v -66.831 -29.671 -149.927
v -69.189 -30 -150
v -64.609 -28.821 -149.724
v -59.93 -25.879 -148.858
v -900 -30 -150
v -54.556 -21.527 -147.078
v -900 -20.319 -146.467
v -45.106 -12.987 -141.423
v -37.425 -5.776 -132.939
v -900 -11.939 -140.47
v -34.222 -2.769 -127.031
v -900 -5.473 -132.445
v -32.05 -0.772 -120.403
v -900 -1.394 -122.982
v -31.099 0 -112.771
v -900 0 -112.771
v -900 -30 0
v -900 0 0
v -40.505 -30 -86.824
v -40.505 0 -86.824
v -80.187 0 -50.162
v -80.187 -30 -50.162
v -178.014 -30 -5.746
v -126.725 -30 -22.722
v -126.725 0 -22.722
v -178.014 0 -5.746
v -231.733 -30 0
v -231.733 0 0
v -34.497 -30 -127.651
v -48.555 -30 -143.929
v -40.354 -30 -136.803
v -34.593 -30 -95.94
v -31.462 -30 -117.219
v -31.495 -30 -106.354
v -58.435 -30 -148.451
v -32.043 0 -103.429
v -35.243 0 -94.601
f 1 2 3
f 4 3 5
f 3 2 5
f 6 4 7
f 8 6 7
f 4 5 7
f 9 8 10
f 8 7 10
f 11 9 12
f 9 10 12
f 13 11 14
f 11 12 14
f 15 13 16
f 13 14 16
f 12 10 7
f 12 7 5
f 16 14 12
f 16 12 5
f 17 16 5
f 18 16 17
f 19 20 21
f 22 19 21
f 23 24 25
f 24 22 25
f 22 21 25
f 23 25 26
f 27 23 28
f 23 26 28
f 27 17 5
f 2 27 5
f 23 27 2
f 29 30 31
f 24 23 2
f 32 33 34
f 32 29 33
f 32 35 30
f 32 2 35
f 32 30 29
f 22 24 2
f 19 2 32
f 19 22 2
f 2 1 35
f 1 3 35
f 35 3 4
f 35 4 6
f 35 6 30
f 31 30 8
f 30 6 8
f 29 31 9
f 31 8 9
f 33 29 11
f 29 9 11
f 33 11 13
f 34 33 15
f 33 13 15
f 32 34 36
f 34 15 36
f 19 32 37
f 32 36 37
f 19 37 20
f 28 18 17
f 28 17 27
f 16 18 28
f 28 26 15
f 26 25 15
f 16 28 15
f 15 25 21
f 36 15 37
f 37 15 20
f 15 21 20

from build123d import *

# Parameters (mm, degrees)
F0_W        = 900
F0_H        = 150
F1_DEPTH    = 30
F2_T1_DEPTH = 1188.6630226256
F3_T1_DEPTH = 405.2304260538
F3_T3_DEPTH = 1086.1451046899


# Not quite as in the source:
# - a fillet or chamfer that OpenCascade refuses, or shapes differently, is made with other operations: its cross-section is extruded or revolved along the edge and cut away or added


with BuildPart() as f1:
    # F0 (on Front) → F1 (new body)
    with BuildSketch(Plane.XZ):
        with Locations((-450, -75)):
            Rectangle(F0_W, F0_H)
    extrude(amount=F1_DEPTH)

    # F2: fillet of radius 254 on 1 edges, made by hand

    # F2_s2 → F2_t1 (cut)
    with BuildSketch(Plane.XZ.offset(-579.3315113128)):
        with BuildLine():
            ThreePointArc((0, -150), (-93.7108671067, -40.7724220463), (-231.7326045251, 0))
            Line((-231.7326045251, 0), (0, 0))
            Line((0, 0), (0, -150))
        make_face()
    extrude(amount=F2_T1_DEPTH, mode=Mode.SUBTRACT)

    # F3: fillet of radius 38.1 on 2 edges, made by hand

    # F3_s2 → F3_t1 (cut)
    with BuildSketch(Plane.XZ.offset(-187.6152130269)):
        with BuildLine():
            ThreePointArc((-69.1890718946, -150), (-34.4974048158, -127.6511344129), (-40.5049190775, -86.8235294118))
            ThreePointArc((-40.5049190775, -86.8235294118), (-17.9063471748, -116.9075798319), (0, -150))
            Line((0, -150), (-69.1890718946, -150))
        make_face()
    extrude(amount=F3_T1_DEPTH, mode=Mode.SUBTRACT)

    # F3_s4 → F3_t3 (cut)
    with BuildSketch(Plane.YZ.offset(-993.0725523449)):
        with BuildLine():
            ThreePointArc((-30, -150), (-8.4333520599, -136.6770452378), (0, -112.770979062))
            Line((0, -112.770979062), (0, -150))
            Line((0, -150), (-30, -150))
        make_face()
    extrude(amount=F3_T3_DEPTH, mode=Mode.SUBTRACT)


solid = f1.part
